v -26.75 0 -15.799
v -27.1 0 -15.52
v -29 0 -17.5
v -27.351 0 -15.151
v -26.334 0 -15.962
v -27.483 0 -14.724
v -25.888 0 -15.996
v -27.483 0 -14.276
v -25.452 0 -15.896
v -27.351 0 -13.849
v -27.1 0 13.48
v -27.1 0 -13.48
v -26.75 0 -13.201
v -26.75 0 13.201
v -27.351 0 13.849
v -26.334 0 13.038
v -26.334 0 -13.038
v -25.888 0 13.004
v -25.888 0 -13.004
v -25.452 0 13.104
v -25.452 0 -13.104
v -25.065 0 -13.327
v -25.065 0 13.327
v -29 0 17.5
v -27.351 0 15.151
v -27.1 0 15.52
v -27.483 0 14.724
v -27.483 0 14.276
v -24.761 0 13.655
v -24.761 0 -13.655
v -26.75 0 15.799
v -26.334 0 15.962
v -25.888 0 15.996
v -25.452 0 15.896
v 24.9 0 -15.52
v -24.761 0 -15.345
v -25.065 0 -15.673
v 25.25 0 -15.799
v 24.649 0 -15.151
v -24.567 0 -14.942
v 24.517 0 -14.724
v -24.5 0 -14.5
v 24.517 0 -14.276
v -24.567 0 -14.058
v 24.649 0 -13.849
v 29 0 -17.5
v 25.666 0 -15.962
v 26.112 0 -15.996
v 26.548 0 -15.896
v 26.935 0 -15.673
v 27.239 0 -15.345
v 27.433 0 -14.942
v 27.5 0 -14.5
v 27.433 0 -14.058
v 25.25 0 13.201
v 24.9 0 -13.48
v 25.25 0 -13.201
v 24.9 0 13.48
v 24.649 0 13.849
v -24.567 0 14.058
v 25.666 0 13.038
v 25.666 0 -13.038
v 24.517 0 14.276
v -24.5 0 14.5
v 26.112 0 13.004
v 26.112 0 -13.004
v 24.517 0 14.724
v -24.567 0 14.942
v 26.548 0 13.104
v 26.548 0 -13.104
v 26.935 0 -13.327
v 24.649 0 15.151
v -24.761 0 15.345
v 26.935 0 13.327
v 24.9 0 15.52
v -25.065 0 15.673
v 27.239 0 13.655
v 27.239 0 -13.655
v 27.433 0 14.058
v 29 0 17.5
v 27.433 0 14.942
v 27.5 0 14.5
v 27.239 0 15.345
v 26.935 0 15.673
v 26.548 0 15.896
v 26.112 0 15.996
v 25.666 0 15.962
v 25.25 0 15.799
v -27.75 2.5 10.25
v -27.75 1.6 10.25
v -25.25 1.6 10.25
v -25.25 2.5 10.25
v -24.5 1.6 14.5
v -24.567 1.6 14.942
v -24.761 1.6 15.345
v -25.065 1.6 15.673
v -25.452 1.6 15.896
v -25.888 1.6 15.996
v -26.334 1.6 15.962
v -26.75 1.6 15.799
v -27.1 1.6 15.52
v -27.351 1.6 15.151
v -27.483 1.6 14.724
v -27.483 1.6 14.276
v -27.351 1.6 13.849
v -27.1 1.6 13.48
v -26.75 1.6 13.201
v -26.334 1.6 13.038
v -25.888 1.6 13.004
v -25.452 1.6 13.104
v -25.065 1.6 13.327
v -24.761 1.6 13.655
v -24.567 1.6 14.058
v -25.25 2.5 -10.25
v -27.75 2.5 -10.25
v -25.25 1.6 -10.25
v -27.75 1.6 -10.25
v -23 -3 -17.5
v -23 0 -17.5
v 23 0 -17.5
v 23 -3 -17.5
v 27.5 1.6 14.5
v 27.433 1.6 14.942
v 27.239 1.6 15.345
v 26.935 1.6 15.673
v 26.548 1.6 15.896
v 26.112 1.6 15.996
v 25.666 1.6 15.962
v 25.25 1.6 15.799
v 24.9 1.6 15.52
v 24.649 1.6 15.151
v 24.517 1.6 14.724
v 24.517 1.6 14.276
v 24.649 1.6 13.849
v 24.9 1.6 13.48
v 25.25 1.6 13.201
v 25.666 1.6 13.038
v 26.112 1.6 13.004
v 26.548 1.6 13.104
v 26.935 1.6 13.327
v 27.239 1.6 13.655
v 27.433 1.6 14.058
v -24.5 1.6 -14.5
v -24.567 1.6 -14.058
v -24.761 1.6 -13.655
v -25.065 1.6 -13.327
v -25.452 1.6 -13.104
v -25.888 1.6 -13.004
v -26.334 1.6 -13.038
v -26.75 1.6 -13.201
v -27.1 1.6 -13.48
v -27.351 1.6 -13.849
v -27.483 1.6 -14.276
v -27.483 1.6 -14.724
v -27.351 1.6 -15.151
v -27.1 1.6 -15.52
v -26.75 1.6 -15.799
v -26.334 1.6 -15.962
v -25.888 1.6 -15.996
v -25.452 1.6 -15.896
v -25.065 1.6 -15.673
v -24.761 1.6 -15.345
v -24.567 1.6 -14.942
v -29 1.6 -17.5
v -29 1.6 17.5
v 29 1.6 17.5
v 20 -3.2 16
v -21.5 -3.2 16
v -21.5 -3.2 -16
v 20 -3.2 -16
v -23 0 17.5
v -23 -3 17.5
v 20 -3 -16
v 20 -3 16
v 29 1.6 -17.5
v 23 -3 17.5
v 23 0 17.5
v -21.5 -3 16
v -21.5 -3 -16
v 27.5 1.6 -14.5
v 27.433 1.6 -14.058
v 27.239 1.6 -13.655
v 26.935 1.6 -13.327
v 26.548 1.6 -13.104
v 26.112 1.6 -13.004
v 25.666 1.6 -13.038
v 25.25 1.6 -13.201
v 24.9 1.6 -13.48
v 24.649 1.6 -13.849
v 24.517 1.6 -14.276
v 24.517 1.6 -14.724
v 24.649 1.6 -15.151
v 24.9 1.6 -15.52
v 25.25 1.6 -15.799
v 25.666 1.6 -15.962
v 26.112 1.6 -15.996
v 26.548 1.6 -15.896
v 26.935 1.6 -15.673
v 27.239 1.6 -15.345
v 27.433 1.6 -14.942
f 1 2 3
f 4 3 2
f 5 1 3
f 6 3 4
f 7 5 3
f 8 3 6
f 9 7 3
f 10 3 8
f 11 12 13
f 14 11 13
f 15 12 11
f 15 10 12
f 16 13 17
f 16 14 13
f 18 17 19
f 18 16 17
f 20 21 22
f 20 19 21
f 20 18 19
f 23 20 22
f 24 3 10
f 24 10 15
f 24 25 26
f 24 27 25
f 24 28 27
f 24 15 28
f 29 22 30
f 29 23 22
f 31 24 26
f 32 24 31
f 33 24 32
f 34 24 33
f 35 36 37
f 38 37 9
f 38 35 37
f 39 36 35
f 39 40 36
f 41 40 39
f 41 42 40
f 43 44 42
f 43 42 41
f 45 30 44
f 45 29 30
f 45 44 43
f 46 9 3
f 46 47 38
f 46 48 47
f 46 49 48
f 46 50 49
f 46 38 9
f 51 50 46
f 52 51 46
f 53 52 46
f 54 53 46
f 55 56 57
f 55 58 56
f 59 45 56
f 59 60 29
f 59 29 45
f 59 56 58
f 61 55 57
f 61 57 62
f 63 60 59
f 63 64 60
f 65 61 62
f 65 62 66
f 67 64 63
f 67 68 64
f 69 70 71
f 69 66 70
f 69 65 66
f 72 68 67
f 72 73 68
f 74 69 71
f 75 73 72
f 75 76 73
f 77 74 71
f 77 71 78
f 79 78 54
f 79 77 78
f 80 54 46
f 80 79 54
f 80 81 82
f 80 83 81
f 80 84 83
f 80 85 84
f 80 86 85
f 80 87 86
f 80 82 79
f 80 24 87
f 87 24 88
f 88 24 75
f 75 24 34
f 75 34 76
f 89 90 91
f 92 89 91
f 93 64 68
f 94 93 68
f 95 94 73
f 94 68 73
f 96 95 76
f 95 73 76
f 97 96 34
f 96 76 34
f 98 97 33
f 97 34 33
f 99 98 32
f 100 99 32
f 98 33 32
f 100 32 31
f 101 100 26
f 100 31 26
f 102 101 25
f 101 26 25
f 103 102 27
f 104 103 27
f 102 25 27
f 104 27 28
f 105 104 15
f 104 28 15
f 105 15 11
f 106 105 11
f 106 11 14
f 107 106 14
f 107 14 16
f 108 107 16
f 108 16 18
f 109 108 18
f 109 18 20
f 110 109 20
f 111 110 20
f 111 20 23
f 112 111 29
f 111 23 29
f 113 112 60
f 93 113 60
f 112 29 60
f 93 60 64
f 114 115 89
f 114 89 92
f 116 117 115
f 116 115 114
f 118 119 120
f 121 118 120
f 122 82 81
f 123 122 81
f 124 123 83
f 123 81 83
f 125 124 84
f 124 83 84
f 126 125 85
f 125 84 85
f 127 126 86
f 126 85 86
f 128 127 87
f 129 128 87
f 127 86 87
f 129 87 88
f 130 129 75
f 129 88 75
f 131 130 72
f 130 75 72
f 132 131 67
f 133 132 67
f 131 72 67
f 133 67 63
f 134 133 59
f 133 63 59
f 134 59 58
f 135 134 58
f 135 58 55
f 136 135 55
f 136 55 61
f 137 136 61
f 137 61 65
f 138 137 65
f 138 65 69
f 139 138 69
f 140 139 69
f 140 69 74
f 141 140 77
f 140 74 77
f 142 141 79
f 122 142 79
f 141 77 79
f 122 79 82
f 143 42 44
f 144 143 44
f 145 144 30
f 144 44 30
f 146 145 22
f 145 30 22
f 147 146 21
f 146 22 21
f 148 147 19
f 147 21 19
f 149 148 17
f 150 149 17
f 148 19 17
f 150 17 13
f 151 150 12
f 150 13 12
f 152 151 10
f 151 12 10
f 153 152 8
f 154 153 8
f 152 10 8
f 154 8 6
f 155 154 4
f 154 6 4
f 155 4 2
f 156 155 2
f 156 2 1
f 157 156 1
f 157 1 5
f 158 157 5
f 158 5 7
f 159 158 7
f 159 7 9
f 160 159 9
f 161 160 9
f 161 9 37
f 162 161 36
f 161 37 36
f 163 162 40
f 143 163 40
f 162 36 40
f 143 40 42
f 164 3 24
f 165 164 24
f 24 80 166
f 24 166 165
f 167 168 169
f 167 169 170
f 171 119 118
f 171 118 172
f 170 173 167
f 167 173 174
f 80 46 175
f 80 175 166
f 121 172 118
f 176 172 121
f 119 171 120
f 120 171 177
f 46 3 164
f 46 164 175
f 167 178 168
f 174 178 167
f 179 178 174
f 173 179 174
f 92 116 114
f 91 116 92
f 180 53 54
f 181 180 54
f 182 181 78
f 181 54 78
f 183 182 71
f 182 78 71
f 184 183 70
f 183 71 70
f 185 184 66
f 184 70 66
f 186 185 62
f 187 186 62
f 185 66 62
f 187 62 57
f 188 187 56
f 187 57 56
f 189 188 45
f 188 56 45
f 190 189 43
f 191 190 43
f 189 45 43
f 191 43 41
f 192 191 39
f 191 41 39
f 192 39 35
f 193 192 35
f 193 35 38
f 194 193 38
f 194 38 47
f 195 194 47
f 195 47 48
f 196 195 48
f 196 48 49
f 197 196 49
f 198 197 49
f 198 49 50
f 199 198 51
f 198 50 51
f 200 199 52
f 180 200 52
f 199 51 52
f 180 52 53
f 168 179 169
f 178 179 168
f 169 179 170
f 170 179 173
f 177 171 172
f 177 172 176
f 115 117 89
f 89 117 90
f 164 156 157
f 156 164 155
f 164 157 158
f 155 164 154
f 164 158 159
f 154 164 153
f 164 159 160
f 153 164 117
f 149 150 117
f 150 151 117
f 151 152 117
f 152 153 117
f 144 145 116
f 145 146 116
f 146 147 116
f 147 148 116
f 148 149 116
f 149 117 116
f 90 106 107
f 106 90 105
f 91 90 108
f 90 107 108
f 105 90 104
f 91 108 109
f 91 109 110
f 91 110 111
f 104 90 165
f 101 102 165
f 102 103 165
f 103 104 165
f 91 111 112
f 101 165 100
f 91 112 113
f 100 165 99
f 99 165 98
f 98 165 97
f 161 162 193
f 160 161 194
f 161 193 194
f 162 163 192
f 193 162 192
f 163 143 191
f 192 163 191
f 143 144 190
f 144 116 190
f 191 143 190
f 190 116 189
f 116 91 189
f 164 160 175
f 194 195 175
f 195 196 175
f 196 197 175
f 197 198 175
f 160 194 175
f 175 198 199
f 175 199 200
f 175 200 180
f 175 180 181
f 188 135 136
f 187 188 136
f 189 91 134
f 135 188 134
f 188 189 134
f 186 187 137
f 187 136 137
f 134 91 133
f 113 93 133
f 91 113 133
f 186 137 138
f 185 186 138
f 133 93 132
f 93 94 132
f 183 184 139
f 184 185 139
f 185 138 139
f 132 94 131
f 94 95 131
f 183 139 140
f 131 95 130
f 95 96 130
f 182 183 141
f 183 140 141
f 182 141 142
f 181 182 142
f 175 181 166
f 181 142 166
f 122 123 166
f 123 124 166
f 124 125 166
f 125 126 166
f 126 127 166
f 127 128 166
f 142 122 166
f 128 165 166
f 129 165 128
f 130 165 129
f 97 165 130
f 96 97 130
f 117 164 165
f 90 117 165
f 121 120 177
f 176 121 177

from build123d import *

# Parameters (mm, degrees)
F0_W     = 46
F0_H     = 35
F0_W_2   = 6
F0_R     = 1.5
F0_W_3   = 2.5
F0_H_2   = 20.5
F1_DEPTH = 1.6
F2_DEPTH = 3
F3_DEPTH = 2.5
F4_W     = 41.5
F4_H     = 32
F5_DEPTH = 0.2


with BuildPart() as f1:
    # F0 (on Front) → F1 (new body)
    with BuildSketch(Plane.XZ):
        Rectangle(F0_W, F0_H)
        with Locations((26, 0)):
            Rectangle(F0_W_2, F0_H)
        with Locations((26, -14.5)):
            Circle(F0_R, mode=Mode.SUBTRACT)
        with Locations((26, 14.5)):
            Circle(F0_R, mode=Mode.SUBTRACT)
        with Locations((-26, 0)):
            Rectangle(F0_W_2, F0_H)
        with Locations((-26, -14.5)):
            Circle(F0_R, mode=Mode.SUBTRACT)
        with Locations((-26.5, 0)):
            Rectangle(F0_W_3, F0_H_2, mode=Mode.SUBTRACT)
        with Locations((-26, 14.5)):
            Circle(F0_R, mode=Mode.SUBTRACT)
    extrude(amount=-F1_DEPTH)

    # F0 (on Front) → F3 (join)
    with BuildSketch(Plane.XZ):
        with Locations((-26.5, 0)):
            Rectangle(F0_W_3, F0_H_2)
    extrude(amount=-F3_DEPTH)


with BuildPart() as f2:
    # F0 (on Front) → F2 (new body)
    with BuildSketch(Plane.XZ):
        Rectangle(F0_W, F0_H)
    extrude(amount=F2_DEPTH)


with BuildPart() as f5:
    # F4 (on face) → F5 (new body)
    with BuildSketch(Plane.XZ.offset(3)):
        with Locations((-0.75, 0)):
            Rectangle(F4_W, F4_H)
    extrude(amount=F5_DEPTH)


solid = Compound([f1.part, f2.part, f5.part])
